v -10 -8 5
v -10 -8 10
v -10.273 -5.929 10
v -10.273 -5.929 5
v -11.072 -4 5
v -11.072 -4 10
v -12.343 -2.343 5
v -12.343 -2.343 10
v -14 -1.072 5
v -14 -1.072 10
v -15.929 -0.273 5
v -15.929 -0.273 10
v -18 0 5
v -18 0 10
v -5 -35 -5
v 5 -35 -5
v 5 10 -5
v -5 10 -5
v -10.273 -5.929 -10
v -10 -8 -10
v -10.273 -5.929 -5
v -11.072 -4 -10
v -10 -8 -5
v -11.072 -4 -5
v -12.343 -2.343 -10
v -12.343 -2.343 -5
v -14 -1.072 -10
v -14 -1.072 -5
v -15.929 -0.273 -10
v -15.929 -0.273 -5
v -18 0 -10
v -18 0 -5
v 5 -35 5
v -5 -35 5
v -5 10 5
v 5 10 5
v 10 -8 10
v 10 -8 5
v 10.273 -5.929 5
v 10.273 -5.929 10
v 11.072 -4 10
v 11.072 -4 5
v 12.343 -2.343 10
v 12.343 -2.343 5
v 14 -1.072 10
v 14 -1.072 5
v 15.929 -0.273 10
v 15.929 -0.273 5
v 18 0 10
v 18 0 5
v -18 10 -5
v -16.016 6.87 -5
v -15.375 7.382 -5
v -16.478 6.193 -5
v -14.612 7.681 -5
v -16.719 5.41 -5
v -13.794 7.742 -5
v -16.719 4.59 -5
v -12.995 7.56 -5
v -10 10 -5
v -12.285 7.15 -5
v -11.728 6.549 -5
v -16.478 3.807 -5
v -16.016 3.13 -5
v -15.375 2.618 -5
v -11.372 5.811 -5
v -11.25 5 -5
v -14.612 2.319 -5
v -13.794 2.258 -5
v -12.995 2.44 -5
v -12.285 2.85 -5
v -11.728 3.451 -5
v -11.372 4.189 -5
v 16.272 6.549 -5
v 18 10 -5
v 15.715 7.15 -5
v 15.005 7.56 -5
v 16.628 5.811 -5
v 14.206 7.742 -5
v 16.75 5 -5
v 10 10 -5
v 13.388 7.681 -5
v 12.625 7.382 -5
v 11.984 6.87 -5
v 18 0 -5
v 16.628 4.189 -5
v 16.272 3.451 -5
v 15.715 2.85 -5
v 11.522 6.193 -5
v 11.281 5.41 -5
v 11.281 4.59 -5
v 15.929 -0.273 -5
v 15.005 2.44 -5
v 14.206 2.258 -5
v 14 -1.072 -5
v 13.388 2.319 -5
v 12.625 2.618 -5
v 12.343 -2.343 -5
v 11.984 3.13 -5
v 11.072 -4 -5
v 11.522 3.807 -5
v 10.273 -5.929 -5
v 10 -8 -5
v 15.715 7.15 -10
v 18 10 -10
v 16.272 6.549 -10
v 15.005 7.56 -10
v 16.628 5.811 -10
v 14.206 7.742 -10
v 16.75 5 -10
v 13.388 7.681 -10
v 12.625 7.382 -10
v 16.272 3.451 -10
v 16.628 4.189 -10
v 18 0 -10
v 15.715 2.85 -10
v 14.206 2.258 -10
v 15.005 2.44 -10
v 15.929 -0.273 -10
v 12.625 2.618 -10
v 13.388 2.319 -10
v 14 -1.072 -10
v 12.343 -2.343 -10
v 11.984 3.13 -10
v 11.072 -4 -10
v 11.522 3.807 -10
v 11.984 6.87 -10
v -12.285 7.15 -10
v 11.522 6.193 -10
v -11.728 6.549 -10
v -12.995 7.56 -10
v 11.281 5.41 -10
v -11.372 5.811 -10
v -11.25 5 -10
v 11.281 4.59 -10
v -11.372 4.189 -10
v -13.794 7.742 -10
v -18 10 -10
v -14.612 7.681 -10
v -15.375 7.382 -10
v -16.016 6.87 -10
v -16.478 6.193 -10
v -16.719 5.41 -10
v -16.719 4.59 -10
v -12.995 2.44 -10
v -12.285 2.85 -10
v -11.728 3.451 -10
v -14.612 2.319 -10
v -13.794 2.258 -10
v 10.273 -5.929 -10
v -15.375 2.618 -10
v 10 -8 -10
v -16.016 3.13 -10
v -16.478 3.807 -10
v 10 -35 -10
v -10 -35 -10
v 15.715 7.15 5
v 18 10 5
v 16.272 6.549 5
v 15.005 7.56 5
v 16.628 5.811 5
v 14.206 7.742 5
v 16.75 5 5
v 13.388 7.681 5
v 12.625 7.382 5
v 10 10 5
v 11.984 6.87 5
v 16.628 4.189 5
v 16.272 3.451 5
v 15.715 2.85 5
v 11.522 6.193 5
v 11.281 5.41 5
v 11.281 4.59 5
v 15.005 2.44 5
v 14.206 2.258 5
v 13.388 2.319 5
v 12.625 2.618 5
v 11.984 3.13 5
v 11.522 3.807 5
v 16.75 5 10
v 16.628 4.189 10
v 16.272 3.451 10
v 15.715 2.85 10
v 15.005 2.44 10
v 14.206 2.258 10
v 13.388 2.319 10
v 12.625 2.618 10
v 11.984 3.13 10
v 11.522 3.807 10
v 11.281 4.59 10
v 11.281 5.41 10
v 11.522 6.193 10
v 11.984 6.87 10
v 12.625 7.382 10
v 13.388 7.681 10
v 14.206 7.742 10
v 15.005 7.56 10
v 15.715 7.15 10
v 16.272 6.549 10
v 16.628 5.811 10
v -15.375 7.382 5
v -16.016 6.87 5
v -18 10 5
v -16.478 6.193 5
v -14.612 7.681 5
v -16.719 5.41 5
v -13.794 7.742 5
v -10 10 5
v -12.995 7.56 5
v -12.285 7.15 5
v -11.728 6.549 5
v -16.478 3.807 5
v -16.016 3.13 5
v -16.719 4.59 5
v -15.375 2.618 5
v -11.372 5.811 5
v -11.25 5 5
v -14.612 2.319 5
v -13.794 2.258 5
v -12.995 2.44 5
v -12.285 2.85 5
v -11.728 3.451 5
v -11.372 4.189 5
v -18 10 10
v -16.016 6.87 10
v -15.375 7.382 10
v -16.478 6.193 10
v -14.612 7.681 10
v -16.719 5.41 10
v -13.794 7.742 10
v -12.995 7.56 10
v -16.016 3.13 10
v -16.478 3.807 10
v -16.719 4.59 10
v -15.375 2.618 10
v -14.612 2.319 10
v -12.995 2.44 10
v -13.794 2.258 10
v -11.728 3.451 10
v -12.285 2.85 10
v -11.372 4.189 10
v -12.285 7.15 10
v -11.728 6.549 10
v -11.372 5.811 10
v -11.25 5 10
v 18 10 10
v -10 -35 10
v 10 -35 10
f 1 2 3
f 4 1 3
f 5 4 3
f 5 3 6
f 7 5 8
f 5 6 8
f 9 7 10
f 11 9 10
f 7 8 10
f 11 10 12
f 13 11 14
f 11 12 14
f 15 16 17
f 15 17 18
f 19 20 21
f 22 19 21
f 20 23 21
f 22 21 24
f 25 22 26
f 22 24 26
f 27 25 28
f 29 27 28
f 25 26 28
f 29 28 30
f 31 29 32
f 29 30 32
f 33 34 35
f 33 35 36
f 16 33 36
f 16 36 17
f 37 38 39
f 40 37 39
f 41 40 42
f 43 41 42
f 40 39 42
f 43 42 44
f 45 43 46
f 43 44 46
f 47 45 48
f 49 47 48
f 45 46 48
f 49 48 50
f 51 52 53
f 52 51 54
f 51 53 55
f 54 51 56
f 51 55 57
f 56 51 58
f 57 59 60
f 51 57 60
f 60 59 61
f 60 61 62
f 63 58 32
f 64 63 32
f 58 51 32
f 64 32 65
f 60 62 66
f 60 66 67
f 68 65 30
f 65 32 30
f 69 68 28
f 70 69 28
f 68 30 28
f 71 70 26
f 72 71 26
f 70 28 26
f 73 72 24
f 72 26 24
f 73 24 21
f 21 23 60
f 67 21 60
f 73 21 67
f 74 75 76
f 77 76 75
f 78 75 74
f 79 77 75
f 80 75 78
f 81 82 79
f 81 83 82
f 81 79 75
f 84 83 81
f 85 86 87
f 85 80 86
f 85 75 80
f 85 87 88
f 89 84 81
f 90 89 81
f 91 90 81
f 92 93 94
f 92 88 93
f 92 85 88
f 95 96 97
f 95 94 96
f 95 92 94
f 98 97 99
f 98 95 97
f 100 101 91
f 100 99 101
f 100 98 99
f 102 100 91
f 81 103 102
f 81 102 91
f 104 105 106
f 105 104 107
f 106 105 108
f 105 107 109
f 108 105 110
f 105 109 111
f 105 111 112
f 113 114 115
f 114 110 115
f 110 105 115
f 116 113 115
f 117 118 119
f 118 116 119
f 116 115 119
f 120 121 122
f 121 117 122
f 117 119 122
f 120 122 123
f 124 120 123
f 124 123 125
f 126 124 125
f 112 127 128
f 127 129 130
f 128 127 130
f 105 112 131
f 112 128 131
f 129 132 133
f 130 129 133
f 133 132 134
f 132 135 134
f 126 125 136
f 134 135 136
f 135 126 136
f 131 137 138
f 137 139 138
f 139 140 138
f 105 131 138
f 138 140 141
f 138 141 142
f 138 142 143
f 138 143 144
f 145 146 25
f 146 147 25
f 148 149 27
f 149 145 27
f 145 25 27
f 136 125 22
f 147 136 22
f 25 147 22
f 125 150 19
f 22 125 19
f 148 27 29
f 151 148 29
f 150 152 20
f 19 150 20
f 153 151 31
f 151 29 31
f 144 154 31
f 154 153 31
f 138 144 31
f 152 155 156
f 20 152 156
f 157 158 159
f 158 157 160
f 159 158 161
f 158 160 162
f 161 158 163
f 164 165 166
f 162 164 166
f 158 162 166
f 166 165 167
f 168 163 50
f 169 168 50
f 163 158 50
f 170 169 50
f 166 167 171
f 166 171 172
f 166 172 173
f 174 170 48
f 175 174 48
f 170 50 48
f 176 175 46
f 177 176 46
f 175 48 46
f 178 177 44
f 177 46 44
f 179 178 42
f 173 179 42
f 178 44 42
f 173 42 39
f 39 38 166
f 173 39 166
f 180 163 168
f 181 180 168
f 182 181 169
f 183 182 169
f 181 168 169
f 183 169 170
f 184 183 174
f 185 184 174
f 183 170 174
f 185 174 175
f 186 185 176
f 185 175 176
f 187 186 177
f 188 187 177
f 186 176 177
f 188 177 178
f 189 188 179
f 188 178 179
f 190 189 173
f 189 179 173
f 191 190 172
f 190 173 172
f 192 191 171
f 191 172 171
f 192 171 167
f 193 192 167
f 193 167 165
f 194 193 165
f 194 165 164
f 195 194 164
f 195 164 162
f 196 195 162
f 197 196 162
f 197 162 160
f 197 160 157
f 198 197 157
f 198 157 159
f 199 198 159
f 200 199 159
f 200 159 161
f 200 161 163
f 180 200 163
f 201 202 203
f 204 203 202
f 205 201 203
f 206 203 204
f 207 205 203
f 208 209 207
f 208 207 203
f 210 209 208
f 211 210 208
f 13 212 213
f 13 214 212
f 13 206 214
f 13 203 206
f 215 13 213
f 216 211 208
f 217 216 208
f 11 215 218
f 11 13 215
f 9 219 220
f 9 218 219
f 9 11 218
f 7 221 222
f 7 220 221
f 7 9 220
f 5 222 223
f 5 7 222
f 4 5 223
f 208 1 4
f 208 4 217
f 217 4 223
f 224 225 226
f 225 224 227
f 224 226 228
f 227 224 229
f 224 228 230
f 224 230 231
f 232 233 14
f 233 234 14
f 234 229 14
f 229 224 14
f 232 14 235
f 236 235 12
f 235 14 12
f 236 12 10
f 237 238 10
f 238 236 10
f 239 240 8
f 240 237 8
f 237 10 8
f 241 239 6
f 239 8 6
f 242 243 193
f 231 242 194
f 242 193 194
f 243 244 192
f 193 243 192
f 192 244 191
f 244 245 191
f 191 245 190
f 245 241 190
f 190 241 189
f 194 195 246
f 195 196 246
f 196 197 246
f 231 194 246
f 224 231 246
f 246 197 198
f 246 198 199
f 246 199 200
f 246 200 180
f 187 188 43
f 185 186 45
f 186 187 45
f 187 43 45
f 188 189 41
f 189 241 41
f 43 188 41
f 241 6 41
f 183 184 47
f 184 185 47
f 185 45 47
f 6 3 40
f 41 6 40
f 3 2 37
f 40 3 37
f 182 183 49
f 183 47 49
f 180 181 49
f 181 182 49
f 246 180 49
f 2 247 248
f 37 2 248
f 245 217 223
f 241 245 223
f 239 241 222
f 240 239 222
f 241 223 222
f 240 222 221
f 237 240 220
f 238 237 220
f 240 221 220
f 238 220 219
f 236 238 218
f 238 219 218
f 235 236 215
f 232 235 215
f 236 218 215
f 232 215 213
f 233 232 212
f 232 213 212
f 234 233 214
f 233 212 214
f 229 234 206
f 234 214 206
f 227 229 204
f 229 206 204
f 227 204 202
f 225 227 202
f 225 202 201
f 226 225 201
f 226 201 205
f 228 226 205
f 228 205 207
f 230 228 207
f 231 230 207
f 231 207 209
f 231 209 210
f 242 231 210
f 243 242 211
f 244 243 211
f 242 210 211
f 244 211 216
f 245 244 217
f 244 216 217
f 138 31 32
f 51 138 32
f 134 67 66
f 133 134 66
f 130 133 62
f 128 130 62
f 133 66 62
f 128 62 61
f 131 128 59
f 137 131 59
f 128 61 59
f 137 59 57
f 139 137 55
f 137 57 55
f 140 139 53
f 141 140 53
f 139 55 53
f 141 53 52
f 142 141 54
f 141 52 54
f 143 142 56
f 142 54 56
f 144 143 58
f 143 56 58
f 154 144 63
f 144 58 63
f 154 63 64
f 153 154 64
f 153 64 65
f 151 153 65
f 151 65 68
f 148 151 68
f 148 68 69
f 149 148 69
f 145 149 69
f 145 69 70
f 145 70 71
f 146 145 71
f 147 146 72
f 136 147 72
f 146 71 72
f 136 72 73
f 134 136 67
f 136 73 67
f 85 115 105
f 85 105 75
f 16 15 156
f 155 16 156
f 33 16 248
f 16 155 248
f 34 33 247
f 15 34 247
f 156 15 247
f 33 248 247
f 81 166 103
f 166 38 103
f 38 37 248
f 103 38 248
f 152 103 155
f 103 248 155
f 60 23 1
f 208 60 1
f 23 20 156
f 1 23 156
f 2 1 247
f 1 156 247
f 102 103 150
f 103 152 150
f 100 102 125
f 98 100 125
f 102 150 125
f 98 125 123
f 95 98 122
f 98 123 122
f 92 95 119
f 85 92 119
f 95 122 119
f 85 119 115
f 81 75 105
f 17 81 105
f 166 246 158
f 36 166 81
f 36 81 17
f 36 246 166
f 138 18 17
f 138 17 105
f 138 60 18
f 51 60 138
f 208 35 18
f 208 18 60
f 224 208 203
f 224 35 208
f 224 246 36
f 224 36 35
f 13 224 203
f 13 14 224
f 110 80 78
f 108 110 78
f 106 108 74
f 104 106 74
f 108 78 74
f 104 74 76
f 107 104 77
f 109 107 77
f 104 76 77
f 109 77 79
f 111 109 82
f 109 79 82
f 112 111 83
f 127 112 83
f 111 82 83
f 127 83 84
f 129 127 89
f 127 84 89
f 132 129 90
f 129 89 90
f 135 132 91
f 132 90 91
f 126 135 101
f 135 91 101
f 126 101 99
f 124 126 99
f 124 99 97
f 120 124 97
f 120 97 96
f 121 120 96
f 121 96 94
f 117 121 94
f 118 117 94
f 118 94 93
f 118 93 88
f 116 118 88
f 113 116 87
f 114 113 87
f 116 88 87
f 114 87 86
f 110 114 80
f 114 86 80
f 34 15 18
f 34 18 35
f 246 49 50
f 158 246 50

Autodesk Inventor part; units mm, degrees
ref_plane "YZ Plane" through (0, 0, 0) normal (1, 0, 0) x (0, 1, 0)
ref_plane "XZ Plane" through (0, 0, 0) normal (0, 1, 0) x (-1, 0, 0)
ref_plane "XY Plane" through (0, 0, 0) normal (0, 0, 1) x (1, 0, 0)
sketch "Schizzo1" plane through (0, 0, 0) normal (0, 1, 0) x (-1, 0, 0)
  line L0 (5, 5) -> (-5, 5)
  line L1 (-5, 5) -> (-5, -5)
  line L2 (-5, -5) -> (5, -5)
  line L3 (5, -5) -> (5, 5)
  line L4 (10, 10) -> (-10, 10)
  line L5 (-10, 10) -> (-10, -10)
  line L6 (-10, -10) -> (10, -10)
  line L7 (10, -10) -> (10, 10)
  line L8 (0, 0) -> (14, 0) construction
  line L9 (0, 0) -> (0, -16.4941) construction
  line L10 (10, 10) -> (18, 10)
  line L11 (18, 10) -> (18, 5)
  line L12 (18, 5) -> (10, 5)
  line L13 (10, -10) -> (18, -10)
  line L14 (18, -10) -> (18, -5)
  line L15 (18, -5) -> (10, -5)
  line L16 (-10, 10) -> (-18, 10)
  line L17 (-18, 10) -> (-18, 5)
  line L18 (-18, 5) -> (-10, 5)
  line L19 (-10, -10) -> (-18, -10)
  line L20 (-18, -10) -> (-18, -5)
  line L21 (-18, -5) -> (-10, -5)
  dimension "d0" = 20
  dimension "d1" = 10
  dimension "d2" = 8
  dimension "d3" = 5
extrude "Estrusione1" add sketch "Schizzo1" along normal blind 10 and the other way blind 35 contours L7 L6 L5 L4
extrude "Estrusione2" add sketch "Schizzo1" along normal blind 10 contours L10 L11 L12 L7 | L5 L18 L17 L16 | L15 L14 L13 L7 | L5 L19 L20 L21
fillet "Raccordo1" radius 8 4 edges at (10, 0, 7.5) (10, 0, -7.5) (-10, 0, -7.5) (-10, 0, 7.5)
sketch "Schizzo2" plane through (0, 0, 0) normal (0, 0, 1) x (1, 0, 0)
  line L0 (-18, 0) -> (-18, 10) projected
  line L1 (-18, 10) -> (18, 10) projected
  line L2 (18, 0) -> (18, 10) projected
  arc A0 (18, 0) -> (10, -8) centre (18, -8) ccw projected
  arc A1 (-10, -8) -> (-18, 0) centre (-18, -8) ccw projected
  line L3 (-10, -8) -> (-10, 10) projected
  line L4 (10, 10) -> (10, -8) projected
  circle A2 centre (-14, 5) radius 2.75
  line L5 (0, 0) -> (0, 11.3165) construction
  circle A3 centre (14, 5) radius 2.75
  dimension "d11" = 5.5
  dimension "d12" = 5
  dimension "d13" = 4
extrude "Estrusione3" cut sketch "Schizzo2" along normal through all both and the other way through all contours A2 | A3
equation "\"RaggioPiega\" = Spessore"
equation "\"LarghezzaScaricoPiega\" = Spessore"
equation "\"ProfonditàScaricoPiega\" = 0.5 * Spessore"
equation "\"DimensioniScaricoAngolo\" = 4 * Spessore"
equation "\"ResiduoMinimo\" = 2 * Spessore"
equation "\"RaggioTransizione\" = RaggioPiega"
equation "\"Dimensione_raggio_Jacobi\" = RaggioPiega"
equation "\"DimensioneGioco\" = Spessore"
equation "\"Spessore\" = 0.5"
properties part number "asta con serraggio pinza"
